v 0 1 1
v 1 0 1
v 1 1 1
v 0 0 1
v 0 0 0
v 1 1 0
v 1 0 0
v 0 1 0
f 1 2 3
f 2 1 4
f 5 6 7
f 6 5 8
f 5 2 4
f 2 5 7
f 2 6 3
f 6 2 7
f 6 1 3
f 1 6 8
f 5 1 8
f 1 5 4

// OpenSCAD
cube(1);
echo(true);

/* This is a single-line comment */

/* This is a multi-line
   comment
*/

/* Broken tested
/* comment */

/* Broken tested
/* weird and shouldnt be
/* comments */

/* comment with single quote' */


echo(2);
